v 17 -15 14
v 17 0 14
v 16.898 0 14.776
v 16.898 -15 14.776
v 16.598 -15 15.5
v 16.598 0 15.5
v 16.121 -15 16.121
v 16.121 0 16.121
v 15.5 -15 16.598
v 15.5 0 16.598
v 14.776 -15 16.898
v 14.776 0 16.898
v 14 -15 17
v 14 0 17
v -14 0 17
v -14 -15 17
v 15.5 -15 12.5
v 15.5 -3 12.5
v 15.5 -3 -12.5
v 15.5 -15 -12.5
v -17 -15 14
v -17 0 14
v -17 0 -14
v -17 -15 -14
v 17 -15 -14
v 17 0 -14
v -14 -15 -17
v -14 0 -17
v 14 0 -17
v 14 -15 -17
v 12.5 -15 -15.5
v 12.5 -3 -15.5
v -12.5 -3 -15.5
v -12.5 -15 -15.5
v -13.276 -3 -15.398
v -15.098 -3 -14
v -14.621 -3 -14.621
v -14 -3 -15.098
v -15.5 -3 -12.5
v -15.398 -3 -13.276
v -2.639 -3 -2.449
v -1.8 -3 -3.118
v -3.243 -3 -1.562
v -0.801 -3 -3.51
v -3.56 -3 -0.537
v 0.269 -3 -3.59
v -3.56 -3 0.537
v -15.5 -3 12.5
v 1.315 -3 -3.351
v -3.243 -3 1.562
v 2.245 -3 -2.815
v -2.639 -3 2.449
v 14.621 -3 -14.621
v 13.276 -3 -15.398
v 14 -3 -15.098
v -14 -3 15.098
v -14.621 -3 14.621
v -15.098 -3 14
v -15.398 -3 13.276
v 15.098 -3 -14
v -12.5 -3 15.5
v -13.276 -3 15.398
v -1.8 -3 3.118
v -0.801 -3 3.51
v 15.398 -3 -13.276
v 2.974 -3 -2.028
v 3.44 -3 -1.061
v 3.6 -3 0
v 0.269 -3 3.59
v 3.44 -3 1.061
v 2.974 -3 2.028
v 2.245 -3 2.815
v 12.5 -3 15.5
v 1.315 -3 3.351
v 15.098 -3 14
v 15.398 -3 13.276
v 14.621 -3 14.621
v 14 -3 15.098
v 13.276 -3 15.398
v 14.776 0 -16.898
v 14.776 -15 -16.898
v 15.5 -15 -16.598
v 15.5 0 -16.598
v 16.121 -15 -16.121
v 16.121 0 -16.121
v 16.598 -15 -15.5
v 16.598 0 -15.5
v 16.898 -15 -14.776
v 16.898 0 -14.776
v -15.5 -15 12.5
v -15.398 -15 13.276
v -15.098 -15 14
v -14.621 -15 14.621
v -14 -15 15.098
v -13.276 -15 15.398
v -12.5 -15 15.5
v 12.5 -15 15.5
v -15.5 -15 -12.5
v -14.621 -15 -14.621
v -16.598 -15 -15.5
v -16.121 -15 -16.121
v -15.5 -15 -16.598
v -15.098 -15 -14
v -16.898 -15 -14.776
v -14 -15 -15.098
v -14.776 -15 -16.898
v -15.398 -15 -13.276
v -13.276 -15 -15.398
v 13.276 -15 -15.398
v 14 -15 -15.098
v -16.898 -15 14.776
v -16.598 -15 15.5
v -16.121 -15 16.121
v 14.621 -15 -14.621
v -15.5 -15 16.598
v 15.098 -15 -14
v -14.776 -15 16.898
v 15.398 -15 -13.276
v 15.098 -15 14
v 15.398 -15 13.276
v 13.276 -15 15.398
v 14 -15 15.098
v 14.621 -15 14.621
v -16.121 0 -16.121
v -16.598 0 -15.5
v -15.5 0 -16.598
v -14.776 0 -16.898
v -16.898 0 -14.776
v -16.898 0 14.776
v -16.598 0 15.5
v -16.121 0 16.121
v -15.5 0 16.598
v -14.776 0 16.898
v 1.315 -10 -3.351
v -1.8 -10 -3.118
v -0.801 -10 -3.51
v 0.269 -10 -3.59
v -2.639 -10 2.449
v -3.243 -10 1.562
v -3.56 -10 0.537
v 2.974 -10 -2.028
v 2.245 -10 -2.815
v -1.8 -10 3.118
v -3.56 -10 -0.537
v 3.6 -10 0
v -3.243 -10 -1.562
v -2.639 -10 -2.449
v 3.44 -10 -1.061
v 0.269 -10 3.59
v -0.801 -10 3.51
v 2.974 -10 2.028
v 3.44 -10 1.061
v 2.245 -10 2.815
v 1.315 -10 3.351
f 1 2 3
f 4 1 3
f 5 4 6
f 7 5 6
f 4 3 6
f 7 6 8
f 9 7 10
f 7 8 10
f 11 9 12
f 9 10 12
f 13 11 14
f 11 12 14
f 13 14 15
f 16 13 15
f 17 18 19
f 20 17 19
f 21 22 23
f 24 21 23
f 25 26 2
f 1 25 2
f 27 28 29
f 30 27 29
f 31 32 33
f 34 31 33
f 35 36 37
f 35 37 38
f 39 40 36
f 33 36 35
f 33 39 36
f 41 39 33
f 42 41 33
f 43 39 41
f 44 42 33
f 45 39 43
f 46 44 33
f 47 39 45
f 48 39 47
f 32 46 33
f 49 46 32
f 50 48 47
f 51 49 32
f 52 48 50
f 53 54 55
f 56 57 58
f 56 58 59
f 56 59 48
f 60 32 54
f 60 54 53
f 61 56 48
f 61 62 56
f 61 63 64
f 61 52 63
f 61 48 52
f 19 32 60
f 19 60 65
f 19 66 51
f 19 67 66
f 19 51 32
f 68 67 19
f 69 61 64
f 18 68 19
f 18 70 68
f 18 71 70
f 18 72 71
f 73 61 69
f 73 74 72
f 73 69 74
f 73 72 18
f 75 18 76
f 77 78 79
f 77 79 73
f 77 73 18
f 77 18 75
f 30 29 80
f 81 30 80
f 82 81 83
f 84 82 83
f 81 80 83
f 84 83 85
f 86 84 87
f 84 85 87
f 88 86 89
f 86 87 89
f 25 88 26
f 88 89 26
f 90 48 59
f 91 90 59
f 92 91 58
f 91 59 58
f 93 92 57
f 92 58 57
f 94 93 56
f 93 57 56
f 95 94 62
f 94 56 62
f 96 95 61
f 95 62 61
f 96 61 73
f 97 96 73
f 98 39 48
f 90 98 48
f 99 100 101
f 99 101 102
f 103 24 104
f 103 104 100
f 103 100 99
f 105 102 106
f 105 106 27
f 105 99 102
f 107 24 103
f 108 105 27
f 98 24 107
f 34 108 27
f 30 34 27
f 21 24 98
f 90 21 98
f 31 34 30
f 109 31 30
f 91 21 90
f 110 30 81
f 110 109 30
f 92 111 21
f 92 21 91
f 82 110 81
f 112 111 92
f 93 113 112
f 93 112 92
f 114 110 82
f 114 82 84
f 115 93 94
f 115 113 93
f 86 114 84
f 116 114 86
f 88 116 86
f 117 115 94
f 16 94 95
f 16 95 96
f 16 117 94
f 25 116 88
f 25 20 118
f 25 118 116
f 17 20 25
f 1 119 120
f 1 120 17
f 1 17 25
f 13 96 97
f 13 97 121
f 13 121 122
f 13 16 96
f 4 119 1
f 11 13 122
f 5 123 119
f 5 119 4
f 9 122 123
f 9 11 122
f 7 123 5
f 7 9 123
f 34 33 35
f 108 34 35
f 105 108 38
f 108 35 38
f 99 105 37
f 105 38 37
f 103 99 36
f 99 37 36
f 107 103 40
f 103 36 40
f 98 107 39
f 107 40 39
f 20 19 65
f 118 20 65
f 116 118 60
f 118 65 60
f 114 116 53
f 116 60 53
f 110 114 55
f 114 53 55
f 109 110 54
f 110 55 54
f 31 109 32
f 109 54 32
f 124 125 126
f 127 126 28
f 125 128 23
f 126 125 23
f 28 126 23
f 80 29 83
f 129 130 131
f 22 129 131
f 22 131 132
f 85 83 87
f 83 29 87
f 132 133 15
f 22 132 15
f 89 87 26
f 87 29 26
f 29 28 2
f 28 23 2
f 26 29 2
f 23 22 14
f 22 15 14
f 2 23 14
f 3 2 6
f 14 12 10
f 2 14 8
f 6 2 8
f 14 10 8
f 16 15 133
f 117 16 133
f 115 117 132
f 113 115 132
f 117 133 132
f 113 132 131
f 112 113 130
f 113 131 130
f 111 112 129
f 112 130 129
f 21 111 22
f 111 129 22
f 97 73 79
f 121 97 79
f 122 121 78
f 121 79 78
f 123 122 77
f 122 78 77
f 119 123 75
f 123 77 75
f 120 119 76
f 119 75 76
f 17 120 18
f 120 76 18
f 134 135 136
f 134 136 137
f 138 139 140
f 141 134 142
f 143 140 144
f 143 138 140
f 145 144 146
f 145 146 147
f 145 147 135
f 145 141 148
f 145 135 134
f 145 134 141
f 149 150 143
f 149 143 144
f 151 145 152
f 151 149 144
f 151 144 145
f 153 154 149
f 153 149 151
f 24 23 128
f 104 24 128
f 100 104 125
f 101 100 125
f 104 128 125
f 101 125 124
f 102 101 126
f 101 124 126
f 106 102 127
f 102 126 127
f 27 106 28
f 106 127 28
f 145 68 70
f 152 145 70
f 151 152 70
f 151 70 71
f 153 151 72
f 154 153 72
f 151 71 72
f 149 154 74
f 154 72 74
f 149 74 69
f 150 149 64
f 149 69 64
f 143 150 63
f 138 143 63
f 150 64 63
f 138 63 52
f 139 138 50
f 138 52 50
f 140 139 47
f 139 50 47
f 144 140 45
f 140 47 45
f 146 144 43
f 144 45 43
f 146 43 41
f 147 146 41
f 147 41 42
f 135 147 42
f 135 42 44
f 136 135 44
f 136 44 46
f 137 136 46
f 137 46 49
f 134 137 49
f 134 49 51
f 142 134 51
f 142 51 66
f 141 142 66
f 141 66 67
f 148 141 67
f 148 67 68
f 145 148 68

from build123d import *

# Parameters (mm, degrees)
F0_R     = 3.6
F1_DEPTH = 3
F2_DEPTH = 10
F3_DEPTH = 15


with BuildPart() as f1:
    # F0 (on Front) → F1 (new body)
    with BuildSketch(Plane.XZ):
        with BuildLine():
            ThreePointArc((15.5, 12.5), (14.62132, 14.62132), (12.5, 15.5))
            Line((12.5, 15.5), (-12.5, 15.5))
            ThreePointArc((-12.5, 15.5), (-14.62132, 14.62132), (-15.5, 12.5))
            Line((-15.5, 12.5), (-15.5, -12.5))
            ThreePointArc((-15.5, -12.5), (-14.62132, -14.62132), (-12.5, -15.5))
            Line((-12.5, -15.5), (12.5, -15.5))
            ThreePointArc((12.5, -15.5), (14.62132, -14.62132), (15.5, -12.5))
            Line((15.5, -12.5), (15.5, 12.5))
        make_face()
        Circle(F0_R, mode=Mode.SUBTRACT)
    extrude(amount=F1_DEPTH)

    # F0 (on Front) → F2 (join)
    with BuildSketch(Plane.XZ):
        Circle(F0_R)
    extrude(amount=F2_DEPTH)

    # F0 (on Front) → F3 (join)
    with BuildSketch(Plane.XZ):
        with BuildLine():
            Line((14, 17), (-14, 17))
            ThreePointArc((-14, 17), (-16.12132, 16.12132), (-17, 14))
            Line((-17, 14), (-17, -14))
            ThreePointArc((-17, -14), (-16.12132, -16.12132), (-14, -17))
            Line((-14, -17), (14, -17))
            ThreePointArc((14, -17), (16.12132, -16.12132), (17, -14))
            Line((17, -14), (17, 14))
            ThreePointArc((17, 14), (16.12132, 16.12132), (14, 17))
        make_face()
        with BuildLine():
            Line((-12.5, 15.5), (12.5, 15.5))
            ThreePointArc((12.5, 15.5), (14.62132, 14.62132), (15.5, 12.5))
            Line((15.5, 12.5), (15.5, -12.5))
            ThreePointArc((15.5, -12.5), (14.62132, -14.62132), (12.5, -15.5))
            Line((12.5, -15.5), (-12.5, -15.5))
            ThreePointArc((-12.5, -15.5), (-14.62132, -14.62132), (-15.5, -12.5))
            Line((-15.5, -12.5), (-15.5, 12.5))
            ThreePointArc((-15.5, 12.5), (-14.62132, 14.62132), (-12.5, 15.5))
        make_face(mode=Mode.SUBTRACT)
    extrude(amount=F3_DEPTH)


solid = f1.part
